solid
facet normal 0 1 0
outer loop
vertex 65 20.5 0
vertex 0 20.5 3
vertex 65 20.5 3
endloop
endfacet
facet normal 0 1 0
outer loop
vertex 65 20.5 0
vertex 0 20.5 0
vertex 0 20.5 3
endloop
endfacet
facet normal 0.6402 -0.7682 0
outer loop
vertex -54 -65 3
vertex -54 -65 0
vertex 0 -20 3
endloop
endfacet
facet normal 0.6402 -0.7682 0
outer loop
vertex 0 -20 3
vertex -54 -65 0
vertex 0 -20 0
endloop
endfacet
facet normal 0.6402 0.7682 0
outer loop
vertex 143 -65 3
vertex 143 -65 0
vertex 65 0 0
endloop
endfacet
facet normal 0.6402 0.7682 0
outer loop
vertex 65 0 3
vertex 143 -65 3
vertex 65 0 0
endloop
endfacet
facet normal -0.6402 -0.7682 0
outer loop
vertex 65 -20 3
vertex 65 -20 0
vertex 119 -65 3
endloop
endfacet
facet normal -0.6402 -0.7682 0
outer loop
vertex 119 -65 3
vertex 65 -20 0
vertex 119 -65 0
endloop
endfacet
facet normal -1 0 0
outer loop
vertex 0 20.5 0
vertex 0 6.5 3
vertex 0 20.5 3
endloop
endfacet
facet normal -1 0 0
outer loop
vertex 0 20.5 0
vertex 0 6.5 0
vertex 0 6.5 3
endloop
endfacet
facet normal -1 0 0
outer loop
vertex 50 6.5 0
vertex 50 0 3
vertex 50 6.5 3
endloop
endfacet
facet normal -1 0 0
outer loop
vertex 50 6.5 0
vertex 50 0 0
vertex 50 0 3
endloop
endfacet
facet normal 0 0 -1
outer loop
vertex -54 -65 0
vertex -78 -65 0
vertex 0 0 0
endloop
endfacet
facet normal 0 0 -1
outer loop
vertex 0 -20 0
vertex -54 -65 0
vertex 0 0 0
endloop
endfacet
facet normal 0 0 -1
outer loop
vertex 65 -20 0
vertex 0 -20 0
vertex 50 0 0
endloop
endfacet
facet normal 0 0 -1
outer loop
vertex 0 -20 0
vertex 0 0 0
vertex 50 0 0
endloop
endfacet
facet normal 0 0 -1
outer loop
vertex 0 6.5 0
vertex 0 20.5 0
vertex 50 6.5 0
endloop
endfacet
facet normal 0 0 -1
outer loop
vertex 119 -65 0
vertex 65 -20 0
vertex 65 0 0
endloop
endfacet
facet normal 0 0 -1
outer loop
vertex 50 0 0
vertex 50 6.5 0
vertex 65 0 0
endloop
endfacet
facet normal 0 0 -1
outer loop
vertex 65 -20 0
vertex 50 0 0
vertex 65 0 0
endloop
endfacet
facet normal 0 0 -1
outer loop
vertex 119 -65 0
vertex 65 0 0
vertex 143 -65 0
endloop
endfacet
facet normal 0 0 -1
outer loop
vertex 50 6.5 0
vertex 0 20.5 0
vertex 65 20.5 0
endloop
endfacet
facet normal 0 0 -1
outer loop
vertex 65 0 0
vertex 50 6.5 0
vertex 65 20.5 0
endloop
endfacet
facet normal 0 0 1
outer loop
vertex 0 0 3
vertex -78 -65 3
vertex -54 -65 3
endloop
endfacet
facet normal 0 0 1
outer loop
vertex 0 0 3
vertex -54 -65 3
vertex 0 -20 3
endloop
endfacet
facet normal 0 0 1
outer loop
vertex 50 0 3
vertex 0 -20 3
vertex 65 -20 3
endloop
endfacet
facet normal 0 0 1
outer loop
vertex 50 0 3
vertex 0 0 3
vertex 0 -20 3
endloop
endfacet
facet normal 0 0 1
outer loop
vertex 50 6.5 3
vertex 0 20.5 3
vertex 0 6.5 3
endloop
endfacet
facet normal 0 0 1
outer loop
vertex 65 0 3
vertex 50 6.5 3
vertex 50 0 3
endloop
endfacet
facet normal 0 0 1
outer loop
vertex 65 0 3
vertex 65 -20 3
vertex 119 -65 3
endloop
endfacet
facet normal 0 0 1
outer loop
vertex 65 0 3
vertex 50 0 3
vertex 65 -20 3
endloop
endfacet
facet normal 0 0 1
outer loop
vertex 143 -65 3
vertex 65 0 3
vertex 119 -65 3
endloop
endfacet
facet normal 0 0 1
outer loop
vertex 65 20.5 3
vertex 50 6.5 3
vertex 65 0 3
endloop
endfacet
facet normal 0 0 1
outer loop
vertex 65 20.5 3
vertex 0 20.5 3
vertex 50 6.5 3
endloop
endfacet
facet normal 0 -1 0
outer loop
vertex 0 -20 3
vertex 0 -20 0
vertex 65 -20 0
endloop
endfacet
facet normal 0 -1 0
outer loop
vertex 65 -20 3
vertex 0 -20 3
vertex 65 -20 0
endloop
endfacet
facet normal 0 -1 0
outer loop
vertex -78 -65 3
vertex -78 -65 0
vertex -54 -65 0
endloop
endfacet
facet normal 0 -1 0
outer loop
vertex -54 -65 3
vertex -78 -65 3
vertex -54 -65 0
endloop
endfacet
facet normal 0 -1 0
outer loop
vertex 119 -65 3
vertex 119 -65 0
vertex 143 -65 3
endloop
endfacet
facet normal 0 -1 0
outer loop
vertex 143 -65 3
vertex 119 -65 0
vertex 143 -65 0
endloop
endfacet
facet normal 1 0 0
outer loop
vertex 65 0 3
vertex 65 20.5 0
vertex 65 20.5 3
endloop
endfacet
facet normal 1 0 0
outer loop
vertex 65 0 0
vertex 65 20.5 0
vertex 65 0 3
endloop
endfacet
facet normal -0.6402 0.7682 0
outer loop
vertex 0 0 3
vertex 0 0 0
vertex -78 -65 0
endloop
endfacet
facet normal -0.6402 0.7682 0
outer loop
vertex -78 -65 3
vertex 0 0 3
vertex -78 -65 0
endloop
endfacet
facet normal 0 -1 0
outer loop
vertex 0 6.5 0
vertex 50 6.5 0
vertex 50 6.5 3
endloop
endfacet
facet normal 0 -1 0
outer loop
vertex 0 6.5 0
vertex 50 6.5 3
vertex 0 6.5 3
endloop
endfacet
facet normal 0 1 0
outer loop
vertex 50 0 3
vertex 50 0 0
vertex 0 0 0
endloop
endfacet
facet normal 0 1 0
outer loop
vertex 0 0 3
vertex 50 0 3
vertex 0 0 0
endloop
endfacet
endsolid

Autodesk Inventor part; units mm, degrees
ref_plane "YZ Plane" through (0, 0, 0) normal (1, 0, 0) x (0, 1, 0)
ref_plane "XZ Plane" through (0, 0, 0) normal (0, 1, 0) x (-1, 0, 0)
ref_plane "XY Plane" through (0, 0, 0) normal (0, 0, 1) x (1, 0, 0)
sketch "Sketch1" plane through (0, 0, 0) normal (0, 0, 1) x (1, 0, 0)
  line L0 (0, 20.5) -> (50, 20.5)
  line L1 (50, 20.5) -> (50, 6.5)
  line L2 (50, 6.5) -> (0, 6.5)
  line L3 (0, 6.5) -> (0, 20.5)
  line L4 (50, 20.5) -> (65, 20.5)
  line L5 (65, 20.5) -> (65, 0)
  line L6 (65, 0) -> (50, 0)
  line L7 (50, 0) -> (50, 20.5)
  line L8 (65, 0) -> (0, 0)
  line L9 (0, 0) -> (0, -20)
  line L10 (0, -20) -> (65, -20)
  line L11 (65, -20) -> (65, 0)
  line L12 (0, 0) -> (-78, -65)
  line L13 (-78, -65) -> (-54, -65)
  line L14 (-54, -65) -> (0, -20)
  line L15 (65, -20) -> (119, -65)
  line L16 (119, -65) -> (143, -65)
  line L17 (143, -65) -> (65, 0)
  point P0 (50, 6.5)
  point P1 (50, 0)
  dimension "d0" = 6.5
  dimension "d1" = 14
  dimension "d2" = 50
  dimension "d3" = 15
  dimension "d4" = 20
  dimension "d6" = 24
  dimension "d7" = 65
  dimension "d10" = 24
extrude "Extrusion1" add sketch "Sketch1" along normal blind 3
properties part number "Support_base"
